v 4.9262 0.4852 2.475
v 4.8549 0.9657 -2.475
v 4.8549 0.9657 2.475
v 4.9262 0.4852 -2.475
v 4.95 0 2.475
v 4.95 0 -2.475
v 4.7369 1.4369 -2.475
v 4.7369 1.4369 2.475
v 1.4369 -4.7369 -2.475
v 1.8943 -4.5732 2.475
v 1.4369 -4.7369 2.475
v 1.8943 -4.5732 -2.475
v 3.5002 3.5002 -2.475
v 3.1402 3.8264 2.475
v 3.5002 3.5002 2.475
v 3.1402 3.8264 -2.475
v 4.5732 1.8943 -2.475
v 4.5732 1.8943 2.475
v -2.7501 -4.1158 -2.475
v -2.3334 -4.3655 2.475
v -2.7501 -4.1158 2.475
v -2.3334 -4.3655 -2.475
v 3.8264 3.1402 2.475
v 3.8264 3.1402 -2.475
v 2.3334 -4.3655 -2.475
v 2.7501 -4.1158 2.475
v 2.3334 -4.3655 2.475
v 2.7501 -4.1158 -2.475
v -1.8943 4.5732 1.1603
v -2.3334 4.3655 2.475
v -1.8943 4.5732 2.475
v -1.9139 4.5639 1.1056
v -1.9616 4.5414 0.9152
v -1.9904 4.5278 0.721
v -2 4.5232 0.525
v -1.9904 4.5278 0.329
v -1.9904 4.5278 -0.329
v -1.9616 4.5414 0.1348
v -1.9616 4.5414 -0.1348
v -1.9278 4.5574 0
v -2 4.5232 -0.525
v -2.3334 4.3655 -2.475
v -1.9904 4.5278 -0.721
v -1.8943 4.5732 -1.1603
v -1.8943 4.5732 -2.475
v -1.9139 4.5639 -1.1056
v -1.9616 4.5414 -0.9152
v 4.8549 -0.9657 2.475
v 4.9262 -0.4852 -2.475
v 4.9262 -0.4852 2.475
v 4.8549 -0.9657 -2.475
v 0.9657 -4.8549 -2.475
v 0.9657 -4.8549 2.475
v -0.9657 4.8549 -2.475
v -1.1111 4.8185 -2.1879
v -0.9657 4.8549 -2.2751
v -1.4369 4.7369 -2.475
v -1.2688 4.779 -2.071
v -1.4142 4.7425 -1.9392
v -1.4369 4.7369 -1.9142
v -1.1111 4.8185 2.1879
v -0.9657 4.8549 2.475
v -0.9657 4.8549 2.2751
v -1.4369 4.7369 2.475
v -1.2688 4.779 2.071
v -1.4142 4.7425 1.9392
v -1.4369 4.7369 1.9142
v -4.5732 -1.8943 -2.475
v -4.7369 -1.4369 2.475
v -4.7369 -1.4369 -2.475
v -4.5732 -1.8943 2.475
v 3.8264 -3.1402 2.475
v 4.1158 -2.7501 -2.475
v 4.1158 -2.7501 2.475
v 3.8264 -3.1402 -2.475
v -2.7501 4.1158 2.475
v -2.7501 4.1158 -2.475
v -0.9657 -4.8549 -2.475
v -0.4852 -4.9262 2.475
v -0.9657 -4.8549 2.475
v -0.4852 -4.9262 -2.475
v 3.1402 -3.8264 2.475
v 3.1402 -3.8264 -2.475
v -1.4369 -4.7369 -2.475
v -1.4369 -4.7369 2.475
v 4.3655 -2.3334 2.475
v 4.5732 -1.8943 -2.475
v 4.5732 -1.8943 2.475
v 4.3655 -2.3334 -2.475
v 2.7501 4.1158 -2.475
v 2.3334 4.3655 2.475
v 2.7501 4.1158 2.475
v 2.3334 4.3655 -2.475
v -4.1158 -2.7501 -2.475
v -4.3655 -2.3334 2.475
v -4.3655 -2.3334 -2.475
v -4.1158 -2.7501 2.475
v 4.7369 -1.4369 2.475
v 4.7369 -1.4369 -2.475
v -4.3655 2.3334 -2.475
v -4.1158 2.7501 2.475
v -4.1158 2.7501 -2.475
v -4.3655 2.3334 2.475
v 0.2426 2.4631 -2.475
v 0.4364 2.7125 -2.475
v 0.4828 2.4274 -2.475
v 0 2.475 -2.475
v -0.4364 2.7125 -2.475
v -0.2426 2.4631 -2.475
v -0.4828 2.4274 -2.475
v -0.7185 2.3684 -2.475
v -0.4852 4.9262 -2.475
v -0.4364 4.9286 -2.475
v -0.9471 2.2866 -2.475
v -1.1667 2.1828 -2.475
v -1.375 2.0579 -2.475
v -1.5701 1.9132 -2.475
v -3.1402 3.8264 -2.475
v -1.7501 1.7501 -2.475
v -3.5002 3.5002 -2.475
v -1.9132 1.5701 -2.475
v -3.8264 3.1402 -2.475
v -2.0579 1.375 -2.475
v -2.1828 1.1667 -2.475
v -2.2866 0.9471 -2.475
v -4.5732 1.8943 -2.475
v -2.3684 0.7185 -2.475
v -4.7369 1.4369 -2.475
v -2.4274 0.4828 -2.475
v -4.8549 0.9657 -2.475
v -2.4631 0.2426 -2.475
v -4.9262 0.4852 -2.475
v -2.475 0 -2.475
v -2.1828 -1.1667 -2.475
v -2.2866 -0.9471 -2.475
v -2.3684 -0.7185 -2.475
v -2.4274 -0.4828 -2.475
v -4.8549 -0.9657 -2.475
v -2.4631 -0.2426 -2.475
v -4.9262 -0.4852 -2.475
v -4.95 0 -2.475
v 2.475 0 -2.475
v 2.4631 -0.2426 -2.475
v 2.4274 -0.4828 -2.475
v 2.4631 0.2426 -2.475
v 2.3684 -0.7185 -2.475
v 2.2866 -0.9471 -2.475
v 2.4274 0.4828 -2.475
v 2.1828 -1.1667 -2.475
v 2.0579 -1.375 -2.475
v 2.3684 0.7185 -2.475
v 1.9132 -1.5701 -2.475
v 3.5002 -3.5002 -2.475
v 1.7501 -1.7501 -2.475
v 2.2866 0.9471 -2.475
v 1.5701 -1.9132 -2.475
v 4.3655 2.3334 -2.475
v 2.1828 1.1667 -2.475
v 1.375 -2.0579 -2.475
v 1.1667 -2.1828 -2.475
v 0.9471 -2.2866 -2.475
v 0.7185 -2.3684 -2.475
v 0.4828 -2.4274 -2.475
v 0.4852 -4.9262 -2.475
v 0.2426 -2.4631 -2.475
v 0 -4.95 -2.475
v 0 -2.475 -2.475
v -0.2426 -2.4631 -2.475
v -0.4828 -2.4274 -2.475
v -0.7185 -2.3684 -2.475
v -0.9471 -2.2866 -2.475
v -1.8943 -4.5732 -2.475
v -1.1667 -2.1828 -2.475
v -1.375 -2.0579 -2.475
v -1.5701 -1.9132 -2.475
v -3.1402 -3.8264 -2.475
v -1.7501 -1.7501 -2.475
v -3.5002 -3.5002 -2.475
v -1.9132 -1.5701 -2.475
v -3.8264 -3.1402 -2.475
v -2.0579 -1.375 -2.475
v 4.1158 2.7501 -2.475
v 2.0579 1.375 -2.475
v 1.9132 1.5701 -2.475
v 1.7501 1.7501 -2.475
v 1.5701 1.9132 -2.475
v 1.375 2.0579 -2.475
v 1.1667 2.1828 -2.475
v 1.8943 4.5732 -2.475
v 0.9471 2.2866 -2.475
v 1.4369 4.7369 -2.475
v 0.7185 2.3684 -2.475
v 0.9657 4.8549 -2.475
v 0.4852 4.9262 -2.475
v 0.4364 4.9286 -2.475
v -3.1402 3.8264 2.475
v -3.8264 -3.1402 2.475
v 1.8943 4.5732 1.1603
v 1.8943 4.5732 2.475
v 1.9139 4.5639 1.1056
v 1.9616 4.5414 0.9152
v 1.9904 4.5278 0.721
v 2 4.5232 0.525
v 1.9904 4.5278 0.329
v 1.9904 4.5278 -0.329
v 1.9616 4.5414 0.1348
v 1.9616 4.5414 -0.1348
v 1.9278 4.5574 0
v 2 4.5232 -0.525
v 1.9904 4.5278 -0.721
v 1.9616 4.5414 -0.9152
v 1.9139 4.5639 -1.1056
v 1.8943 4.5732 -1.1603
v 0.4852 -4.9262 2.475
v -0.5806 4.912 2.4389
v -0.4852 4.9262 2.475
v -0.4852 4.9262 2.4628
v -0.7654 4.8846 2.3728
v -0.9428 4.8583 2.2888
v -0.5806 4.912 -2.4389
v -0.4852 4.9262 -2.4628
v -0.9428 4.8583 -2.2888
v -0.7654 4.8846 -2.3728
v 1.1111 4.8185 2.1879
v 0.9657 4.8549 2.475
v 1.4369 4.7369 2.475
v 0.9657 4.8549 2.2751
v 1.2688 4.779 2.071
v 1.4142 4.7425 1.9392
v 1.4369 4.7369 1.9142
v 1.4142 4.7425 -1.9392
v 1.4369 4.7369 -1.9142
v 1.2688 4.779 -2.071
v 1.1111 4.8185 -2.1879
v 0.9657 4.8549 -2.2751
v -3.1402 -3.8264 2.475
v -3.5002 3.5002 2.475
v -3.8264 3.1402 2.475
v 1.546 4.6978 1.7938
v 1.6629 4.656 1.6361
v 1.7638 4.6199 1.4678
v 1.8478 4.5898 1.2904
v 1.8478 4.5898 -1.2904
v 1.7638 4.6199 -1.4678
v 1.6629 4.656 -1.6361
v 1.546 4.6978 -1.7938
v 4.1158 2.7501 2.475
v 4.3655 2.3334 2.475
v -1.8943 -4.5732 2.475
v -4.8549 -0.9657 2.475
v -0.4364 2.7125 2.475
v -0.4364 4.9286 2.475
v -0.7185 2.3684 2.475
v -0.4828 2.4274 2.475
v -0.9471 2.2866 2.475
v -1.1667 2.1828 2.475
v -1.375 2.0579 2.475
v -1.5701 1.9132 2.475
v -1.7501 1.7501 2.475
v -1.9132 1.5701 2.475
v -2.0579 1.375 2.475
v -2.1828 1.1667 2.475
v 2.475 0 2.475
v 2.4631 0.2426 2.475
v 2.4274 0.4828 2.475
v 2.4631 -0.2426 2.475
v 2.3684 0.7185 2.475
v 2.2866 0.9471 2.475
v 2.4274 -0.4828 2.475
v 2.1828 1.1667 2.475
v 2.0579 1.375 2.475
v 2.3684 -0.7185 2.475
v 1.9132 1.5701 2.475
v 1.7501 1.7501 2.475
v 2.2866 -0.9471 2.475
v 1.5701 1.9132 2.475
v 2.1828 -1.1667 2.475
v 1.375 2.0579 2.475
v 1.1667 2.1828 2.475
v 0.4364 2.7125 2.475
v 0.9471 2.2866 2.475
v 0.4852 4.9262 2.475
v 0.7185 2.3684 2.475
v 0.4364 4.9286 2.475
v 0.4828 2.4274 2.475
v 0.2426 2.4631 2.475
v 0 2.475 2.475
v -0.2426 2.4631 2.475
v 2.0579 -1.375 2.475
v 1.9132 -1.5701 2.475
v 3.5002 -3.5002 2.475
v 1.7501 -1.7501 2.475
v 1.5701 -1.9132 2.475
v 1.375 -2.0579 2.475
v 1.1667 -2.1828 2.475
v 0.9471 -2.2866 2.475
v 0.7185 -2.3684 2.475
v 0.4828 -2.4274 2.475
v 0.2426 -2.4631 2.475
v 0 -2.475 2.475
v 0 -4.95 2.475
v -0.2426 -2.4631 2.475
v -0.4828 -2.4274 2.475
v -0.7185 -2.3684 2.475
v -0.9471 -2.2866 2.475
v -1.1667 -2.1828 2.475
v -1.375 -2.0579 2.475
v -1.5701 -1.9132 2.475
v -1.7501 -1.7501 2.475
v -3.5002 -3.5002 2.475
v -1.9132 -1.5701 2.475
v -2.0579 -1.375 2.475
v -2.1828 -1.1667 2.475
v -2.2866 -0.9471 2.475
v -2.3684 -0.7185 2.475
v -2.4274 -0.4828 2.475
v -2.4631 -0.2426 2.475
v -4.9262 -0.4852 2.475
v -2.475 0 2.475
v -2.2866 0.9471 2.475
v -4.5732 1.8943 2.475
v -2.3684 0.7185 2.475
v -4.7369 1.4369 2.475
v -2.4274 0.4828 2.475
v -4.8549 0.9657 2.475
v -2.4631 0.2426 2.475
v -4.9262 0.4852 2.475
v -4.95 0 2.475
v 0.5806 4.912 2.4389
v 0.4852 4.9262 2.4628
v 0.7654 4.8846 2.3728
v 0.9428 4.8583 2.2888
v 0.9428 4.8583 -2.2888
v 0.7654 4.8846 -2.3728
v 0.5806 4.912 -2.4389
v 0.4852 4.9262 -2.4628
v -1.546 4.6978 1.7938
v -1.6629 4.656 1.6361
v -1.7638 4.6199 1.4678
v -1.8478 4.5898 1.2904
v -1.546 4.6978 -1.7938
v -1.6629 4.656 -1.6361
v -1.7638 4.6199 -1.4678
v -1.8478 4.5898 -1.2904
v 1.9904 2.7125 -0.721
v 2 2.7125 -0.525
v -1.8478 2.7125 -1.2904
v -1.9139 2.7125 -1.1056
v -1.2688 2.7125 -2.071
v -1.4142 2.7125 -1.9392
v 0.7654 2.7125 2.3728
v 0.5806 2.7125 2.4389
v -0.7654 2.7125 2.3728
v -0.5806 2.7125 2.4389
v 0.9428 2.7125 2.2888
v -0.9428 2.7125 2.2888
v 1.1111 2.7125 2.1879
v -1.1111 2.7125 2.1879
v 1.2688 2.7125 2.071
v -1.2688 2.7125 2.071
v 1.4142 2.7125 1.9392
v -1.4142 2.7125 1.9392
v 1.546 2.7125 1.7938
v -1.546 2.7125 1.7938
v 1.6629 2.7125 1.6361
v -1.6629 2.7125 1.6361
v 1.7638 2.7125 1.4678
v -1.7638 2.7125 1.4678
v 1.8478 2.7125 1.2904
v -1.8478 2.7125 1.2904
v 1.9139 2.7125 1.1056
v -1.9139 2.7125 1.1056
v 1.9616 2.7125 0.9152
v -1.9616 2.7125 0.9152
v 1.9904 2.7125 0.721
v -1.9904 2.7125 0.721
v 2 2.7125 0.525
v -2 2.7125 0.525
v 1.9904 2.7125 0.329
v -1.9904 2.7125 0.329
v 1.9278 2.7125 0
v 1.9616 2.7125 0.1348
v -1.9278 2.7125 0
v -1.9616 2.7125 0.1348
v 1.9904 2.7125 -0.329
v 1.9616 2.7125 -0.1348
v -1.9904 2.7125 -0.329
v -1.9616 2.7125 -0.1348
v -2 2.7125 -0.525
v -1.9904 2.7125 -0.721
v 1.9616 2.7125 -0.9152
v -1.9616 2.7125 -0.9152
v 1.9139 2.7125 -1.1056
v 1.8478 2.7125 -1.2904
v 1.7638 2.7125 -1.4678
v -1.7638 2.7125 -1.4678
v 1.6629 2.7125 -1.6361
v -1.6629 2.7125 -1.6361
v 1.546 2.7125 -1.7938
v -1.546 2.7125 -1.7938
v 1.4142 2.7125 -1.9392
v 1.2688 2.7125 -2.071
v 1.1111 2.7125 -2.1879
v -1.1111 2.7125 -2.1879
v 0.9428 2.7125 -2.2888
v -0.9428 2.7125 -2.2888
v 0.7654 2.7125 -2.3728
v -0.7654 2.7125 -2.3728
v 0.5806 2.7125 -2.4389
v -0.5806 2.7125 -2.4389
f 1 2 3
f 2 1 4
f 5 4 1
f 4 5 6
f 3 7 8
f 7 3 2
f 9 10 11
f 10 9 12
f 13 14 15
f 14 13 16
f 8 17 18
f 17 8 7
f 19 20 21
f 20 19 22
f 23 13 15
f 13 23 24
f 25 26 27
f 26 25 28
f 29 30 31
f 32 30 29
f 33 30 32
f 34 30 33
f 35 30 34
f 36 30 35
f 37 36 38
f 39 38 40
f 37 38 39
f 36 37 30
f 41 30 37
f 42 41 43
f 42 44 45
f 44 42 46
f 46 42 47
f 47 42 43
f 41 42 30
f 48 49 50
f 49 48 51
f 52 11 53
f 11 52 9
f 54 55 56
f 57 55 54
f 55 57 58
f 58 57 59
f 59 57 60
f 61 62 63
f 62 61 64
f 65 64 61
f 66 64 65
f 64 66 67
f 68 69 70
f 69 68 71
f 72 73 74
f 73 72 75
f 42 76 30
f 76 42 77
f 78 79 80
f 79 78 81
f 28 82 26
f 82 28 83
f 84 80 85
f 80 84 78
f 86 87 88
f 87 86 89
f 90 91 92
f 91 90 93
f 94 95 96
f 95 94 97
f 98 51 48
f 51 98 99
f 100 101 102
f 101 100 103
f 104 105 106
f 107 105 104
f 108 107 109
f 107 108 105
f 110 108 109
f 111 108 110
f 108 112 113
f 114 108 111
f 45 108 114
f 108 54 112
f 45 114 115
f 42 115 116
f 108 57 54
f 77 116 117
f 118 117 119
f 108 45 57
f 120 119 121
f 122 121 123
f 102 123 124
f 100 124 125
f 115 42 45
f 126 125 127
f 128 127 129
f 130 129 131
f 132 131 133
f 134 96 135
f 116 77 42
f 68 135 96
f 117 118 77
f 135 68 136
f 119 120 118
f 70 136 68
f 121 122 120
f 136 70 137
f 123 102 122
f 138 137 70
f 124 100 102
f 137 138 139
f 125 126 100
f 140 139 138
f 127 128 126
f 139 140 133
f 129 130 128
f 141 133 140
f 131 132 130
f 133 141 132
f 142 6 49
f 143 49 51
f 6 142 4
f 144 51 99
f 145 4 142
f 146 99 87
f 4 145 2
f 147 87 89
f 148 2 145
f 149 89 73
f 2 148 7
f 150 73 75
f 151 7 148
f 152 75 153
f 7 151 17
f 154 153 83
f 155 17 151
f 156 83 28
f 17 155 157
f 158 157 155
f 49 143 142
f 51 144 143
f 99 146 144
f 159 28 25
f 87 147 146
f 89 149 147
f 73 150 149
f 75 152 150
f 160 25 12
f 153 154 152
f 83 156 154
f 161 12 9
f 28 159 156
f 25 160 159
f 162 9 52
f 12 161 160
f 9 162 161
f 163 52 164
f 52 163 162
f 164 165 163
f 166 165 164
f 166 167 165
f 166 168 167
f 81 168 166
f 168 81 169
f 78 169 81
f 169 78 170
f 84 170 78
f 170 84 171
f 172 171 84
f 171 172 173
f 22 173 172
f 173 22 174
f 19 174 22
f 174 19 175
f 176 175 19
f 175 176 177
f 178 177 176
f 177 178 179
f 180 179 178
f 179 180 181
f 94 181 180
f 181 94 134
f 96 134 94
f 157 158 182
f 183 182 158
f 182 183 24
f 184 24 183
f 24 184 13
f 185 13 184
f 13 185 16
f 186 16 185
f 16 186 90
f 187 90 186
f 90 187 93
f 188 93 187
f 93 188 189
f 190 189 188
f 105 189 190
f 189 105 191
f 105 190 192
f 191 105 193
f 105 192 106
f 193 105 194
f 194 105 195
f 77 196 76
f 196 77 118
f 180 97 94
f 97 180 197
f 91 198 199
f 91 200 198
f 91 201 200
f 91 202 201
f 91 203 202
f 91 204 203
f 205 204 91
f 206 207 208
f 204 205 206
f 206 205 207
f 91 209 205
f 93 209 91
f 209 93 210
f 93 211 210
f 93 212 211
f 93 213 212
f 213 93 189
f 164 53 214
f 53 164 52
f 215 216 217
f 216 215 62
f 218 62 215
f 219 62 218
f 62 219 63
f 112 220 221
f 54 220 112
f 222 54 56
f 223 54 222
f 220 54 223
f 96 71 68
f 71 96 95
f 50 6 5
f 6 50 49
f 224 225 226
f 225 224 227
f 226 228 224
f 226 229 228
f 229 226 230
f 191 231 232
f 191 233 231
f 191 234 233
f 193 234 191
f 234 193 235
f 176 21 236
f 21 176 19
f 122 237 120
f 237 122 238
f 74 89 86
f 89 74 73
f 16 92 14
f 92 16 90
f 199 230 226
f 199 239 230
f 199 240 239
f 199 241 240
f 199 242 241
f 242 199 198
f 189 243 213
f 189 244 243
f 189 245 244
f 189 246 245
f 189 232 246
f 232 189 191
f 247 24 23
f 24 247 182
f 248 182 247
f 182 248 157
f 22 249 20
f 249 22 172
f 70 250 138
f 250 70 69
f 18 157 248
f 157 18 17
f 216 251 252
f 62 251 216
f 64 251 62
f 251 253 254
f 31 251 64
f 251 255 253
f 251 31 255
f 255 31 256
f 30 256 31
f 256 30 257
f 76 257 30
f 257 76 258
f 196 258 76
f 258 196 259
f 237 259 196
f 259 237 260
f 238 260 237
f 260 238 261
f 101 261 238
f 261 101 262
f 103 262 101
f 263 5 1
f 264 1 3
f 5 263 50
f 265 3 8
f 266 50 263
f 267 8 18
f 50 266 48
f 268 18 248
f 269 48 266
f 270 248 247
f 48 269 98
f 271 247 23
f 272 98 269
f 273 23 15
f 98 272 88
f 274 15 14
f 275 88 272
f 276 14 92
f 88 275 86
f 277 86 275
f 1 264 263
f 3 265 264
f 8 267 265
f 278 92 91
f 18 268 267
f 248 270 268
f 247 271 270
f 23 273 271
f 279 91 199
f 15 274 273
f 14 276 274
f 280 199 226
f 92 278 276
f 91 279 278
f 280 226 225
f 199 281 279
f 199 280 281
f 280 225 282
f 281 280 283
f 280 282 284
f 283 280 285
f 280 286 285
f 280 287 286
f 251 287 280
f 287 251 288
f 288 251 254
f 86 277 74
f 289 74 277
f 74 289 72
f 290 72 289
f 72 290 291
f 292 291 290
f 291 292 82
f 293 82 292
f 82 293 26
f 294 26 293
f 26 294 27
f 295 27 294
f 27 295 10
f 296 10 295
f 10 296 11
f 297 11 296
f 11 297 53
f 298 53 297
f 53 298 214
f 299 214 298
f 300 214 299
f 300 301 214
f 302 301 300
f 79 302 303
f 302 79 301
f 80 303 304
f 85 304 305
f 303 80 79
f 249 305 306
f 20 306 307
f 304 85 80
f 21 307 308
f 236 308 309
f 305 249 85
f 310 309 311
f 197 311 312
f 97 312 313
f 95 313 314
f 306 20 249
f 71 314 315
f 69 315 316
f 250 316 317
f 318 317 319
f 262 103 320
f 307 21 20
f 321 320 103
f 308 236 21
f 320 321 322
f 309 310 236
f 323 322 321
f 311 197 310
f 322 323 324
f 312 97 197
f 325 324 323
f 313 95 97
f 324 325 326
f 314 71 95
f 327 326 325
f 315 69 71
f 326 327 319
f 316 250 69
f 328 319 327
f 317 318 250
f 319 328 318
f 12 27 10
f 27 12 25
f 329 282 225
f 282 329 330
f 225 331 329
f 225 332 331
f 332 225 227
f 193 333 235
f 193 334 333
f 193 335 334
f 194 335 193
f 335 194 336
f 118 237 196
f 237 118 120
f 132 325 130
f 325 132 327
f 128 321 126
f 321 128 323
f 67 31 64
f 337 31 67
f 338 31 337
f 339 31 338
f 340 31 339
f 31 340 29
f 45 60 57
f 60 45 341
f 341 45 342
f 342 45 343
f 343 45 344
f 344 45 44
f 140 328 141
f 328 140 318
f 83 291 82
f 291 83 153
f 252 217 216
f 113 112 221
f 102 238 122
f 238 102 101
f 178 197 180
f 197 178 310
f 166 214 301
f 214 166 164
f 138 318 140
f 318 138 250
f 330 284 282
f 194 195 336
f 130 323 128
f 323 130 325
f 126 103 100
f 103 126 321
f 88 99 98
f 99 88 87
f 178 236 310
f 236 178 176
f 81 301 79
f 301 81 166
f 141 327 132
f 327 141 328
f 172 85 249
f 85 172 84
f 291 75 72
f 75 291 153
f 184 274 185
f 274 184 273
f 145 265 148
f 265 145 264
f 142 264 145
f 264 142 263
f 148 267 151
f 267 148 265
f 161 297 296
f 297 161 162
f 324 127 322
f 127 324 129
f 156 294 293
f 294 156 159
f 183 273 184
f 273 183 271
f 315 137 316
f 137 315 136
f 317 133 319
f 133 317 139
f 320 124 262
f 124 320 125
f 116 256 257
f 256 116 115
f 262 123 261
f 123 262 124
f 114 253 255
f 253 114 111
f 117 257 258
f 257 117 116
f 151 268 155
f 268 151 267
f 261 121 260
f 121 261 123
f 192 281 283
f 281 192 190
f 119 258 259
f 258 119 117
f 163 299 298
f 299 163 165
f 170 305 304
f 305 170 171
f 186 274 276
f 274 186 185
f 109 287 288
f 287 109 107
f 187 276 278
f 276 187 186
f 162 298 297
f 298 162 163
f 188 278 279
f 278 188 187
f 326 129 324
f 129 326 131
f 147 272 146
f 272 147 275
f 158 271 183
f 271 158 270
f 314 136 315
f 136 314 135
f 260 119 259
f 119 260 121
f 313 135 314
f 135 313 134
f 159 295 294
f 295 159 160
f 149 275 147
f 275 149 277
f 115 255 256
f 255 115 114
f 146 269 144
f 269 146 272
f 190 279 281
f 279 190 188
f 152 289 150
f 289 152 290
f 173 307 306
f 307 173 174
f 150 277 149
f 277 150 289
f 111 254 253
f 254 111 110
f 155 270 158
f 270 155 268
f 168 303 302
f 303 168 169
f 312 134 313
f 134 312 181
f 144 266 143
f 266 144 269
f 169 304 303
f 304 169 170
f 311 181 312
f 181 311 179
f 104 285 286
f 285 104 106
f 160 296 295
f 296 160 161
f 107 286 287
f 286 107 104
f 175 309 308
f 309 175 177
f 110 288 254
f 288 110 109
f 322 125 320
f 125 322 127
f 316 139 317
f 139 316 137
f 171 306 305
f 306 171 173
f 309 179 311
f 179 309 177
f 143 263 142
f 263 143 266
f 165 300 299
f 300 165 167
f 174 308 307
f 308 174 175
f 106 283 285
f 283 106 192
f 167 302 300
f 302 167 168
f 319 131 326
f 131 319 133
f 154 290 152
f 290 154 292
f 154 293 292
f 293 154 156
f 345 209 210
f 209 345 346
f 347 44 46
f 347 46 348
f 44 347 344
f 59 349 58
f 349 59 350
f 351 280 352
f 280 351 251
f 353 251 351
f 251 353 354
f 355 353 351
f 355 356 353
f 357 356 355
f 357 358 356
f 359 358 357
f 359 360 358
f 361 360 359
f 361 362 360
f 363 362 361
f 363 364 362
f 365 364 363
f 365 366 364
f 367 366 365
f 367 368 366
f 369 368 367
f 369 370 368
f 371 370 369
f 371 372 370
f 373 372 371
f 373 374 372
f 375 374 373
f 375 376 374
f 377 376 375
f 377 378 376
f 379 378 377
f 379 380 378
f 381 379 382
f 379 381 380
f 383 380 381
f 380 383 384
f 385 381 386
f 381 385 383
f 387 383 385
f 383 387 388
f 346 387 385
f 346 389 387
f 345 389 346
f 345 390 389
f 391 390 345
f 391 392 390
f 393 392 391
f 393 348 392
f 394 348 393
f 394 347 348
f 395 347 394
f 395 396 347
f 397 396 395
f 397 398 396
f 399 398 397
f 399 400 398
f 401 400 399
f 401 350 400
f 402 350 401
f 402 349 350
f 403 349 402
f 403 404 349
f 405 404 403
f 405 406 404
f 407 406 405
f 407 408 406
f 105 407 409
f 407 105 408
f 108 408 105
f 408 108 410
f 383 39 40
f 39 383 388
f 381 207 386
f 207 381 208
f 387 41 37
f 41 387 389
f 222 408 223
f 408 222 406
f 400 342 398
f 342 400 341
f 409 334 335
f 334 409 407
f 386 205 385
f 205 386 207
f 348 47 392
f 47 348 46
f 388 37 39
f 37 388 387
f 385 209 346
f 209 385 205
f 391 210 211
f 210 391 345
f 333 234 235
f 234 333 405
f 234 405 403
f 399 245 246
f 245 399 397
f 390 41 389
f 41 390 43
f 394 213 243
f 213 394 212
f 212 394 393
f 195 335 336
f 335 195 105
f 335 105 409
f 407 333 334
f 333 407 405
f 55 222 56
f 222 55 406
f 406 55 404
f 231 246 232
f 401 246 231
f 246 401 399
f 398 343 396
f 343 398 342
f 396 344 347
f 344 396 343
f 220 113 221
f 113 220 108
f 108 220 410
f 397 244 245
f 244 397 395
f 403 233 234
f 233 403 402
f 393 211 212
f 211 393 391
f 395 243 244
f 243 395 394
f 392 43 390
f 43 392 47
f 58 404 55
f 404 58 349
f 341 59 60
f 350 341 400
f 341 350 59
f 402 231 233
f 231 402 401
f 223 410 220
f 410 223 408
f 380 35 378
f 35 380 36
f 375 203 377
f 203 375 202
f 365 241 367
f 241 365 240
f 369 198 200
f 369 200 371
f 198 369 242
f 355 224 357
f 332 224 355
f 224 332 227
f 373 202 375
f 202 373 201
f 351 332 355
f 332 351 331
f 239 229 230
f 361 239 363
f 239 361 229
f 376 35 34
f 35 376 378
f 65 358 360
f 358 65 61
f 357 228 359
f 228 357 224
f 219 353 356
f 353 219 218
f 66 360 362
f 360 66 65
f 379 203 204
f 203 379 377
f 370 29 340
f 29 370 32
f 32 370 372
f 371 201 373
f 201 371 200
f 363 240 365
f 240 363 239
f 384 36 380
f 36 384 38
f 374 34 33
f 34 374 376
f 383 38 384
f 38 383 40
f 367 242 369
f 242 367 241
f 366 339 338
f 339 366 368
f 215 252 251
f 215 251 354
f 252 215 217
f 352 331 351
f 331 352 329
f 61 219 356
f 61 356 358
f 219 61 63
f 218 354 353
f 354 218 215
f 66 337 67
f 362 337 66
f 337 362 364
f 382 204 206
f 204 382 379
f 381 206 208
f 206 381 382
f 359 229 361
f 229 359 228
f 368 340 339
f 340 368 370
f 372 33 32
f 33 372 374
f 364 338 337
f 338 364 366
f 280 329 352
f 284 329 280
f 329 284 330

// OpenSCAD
// COBRA Vertebra - C2 V1
// Height: 4.95mm, OD: 9.9mm

$fn = 64;

difference() {
    // Outer cylinder
    cylinder(h=4.95, d=9.9, center=true);
    
    // Inner channel
    cylinder(h=6.95, d=4.95, center=true);

    // Pivot holes
    translate([0, 4.95, -0.5249999999999999])
    rotate([90, 0, 0])
    cylinder(h=4.475, d=4, center=true);
    
    translate([0, 4.95, 0.5249999999999999])
    rotate([90, 0, 0])
    cylinder(h=4.475, d=4, center=true);
}
